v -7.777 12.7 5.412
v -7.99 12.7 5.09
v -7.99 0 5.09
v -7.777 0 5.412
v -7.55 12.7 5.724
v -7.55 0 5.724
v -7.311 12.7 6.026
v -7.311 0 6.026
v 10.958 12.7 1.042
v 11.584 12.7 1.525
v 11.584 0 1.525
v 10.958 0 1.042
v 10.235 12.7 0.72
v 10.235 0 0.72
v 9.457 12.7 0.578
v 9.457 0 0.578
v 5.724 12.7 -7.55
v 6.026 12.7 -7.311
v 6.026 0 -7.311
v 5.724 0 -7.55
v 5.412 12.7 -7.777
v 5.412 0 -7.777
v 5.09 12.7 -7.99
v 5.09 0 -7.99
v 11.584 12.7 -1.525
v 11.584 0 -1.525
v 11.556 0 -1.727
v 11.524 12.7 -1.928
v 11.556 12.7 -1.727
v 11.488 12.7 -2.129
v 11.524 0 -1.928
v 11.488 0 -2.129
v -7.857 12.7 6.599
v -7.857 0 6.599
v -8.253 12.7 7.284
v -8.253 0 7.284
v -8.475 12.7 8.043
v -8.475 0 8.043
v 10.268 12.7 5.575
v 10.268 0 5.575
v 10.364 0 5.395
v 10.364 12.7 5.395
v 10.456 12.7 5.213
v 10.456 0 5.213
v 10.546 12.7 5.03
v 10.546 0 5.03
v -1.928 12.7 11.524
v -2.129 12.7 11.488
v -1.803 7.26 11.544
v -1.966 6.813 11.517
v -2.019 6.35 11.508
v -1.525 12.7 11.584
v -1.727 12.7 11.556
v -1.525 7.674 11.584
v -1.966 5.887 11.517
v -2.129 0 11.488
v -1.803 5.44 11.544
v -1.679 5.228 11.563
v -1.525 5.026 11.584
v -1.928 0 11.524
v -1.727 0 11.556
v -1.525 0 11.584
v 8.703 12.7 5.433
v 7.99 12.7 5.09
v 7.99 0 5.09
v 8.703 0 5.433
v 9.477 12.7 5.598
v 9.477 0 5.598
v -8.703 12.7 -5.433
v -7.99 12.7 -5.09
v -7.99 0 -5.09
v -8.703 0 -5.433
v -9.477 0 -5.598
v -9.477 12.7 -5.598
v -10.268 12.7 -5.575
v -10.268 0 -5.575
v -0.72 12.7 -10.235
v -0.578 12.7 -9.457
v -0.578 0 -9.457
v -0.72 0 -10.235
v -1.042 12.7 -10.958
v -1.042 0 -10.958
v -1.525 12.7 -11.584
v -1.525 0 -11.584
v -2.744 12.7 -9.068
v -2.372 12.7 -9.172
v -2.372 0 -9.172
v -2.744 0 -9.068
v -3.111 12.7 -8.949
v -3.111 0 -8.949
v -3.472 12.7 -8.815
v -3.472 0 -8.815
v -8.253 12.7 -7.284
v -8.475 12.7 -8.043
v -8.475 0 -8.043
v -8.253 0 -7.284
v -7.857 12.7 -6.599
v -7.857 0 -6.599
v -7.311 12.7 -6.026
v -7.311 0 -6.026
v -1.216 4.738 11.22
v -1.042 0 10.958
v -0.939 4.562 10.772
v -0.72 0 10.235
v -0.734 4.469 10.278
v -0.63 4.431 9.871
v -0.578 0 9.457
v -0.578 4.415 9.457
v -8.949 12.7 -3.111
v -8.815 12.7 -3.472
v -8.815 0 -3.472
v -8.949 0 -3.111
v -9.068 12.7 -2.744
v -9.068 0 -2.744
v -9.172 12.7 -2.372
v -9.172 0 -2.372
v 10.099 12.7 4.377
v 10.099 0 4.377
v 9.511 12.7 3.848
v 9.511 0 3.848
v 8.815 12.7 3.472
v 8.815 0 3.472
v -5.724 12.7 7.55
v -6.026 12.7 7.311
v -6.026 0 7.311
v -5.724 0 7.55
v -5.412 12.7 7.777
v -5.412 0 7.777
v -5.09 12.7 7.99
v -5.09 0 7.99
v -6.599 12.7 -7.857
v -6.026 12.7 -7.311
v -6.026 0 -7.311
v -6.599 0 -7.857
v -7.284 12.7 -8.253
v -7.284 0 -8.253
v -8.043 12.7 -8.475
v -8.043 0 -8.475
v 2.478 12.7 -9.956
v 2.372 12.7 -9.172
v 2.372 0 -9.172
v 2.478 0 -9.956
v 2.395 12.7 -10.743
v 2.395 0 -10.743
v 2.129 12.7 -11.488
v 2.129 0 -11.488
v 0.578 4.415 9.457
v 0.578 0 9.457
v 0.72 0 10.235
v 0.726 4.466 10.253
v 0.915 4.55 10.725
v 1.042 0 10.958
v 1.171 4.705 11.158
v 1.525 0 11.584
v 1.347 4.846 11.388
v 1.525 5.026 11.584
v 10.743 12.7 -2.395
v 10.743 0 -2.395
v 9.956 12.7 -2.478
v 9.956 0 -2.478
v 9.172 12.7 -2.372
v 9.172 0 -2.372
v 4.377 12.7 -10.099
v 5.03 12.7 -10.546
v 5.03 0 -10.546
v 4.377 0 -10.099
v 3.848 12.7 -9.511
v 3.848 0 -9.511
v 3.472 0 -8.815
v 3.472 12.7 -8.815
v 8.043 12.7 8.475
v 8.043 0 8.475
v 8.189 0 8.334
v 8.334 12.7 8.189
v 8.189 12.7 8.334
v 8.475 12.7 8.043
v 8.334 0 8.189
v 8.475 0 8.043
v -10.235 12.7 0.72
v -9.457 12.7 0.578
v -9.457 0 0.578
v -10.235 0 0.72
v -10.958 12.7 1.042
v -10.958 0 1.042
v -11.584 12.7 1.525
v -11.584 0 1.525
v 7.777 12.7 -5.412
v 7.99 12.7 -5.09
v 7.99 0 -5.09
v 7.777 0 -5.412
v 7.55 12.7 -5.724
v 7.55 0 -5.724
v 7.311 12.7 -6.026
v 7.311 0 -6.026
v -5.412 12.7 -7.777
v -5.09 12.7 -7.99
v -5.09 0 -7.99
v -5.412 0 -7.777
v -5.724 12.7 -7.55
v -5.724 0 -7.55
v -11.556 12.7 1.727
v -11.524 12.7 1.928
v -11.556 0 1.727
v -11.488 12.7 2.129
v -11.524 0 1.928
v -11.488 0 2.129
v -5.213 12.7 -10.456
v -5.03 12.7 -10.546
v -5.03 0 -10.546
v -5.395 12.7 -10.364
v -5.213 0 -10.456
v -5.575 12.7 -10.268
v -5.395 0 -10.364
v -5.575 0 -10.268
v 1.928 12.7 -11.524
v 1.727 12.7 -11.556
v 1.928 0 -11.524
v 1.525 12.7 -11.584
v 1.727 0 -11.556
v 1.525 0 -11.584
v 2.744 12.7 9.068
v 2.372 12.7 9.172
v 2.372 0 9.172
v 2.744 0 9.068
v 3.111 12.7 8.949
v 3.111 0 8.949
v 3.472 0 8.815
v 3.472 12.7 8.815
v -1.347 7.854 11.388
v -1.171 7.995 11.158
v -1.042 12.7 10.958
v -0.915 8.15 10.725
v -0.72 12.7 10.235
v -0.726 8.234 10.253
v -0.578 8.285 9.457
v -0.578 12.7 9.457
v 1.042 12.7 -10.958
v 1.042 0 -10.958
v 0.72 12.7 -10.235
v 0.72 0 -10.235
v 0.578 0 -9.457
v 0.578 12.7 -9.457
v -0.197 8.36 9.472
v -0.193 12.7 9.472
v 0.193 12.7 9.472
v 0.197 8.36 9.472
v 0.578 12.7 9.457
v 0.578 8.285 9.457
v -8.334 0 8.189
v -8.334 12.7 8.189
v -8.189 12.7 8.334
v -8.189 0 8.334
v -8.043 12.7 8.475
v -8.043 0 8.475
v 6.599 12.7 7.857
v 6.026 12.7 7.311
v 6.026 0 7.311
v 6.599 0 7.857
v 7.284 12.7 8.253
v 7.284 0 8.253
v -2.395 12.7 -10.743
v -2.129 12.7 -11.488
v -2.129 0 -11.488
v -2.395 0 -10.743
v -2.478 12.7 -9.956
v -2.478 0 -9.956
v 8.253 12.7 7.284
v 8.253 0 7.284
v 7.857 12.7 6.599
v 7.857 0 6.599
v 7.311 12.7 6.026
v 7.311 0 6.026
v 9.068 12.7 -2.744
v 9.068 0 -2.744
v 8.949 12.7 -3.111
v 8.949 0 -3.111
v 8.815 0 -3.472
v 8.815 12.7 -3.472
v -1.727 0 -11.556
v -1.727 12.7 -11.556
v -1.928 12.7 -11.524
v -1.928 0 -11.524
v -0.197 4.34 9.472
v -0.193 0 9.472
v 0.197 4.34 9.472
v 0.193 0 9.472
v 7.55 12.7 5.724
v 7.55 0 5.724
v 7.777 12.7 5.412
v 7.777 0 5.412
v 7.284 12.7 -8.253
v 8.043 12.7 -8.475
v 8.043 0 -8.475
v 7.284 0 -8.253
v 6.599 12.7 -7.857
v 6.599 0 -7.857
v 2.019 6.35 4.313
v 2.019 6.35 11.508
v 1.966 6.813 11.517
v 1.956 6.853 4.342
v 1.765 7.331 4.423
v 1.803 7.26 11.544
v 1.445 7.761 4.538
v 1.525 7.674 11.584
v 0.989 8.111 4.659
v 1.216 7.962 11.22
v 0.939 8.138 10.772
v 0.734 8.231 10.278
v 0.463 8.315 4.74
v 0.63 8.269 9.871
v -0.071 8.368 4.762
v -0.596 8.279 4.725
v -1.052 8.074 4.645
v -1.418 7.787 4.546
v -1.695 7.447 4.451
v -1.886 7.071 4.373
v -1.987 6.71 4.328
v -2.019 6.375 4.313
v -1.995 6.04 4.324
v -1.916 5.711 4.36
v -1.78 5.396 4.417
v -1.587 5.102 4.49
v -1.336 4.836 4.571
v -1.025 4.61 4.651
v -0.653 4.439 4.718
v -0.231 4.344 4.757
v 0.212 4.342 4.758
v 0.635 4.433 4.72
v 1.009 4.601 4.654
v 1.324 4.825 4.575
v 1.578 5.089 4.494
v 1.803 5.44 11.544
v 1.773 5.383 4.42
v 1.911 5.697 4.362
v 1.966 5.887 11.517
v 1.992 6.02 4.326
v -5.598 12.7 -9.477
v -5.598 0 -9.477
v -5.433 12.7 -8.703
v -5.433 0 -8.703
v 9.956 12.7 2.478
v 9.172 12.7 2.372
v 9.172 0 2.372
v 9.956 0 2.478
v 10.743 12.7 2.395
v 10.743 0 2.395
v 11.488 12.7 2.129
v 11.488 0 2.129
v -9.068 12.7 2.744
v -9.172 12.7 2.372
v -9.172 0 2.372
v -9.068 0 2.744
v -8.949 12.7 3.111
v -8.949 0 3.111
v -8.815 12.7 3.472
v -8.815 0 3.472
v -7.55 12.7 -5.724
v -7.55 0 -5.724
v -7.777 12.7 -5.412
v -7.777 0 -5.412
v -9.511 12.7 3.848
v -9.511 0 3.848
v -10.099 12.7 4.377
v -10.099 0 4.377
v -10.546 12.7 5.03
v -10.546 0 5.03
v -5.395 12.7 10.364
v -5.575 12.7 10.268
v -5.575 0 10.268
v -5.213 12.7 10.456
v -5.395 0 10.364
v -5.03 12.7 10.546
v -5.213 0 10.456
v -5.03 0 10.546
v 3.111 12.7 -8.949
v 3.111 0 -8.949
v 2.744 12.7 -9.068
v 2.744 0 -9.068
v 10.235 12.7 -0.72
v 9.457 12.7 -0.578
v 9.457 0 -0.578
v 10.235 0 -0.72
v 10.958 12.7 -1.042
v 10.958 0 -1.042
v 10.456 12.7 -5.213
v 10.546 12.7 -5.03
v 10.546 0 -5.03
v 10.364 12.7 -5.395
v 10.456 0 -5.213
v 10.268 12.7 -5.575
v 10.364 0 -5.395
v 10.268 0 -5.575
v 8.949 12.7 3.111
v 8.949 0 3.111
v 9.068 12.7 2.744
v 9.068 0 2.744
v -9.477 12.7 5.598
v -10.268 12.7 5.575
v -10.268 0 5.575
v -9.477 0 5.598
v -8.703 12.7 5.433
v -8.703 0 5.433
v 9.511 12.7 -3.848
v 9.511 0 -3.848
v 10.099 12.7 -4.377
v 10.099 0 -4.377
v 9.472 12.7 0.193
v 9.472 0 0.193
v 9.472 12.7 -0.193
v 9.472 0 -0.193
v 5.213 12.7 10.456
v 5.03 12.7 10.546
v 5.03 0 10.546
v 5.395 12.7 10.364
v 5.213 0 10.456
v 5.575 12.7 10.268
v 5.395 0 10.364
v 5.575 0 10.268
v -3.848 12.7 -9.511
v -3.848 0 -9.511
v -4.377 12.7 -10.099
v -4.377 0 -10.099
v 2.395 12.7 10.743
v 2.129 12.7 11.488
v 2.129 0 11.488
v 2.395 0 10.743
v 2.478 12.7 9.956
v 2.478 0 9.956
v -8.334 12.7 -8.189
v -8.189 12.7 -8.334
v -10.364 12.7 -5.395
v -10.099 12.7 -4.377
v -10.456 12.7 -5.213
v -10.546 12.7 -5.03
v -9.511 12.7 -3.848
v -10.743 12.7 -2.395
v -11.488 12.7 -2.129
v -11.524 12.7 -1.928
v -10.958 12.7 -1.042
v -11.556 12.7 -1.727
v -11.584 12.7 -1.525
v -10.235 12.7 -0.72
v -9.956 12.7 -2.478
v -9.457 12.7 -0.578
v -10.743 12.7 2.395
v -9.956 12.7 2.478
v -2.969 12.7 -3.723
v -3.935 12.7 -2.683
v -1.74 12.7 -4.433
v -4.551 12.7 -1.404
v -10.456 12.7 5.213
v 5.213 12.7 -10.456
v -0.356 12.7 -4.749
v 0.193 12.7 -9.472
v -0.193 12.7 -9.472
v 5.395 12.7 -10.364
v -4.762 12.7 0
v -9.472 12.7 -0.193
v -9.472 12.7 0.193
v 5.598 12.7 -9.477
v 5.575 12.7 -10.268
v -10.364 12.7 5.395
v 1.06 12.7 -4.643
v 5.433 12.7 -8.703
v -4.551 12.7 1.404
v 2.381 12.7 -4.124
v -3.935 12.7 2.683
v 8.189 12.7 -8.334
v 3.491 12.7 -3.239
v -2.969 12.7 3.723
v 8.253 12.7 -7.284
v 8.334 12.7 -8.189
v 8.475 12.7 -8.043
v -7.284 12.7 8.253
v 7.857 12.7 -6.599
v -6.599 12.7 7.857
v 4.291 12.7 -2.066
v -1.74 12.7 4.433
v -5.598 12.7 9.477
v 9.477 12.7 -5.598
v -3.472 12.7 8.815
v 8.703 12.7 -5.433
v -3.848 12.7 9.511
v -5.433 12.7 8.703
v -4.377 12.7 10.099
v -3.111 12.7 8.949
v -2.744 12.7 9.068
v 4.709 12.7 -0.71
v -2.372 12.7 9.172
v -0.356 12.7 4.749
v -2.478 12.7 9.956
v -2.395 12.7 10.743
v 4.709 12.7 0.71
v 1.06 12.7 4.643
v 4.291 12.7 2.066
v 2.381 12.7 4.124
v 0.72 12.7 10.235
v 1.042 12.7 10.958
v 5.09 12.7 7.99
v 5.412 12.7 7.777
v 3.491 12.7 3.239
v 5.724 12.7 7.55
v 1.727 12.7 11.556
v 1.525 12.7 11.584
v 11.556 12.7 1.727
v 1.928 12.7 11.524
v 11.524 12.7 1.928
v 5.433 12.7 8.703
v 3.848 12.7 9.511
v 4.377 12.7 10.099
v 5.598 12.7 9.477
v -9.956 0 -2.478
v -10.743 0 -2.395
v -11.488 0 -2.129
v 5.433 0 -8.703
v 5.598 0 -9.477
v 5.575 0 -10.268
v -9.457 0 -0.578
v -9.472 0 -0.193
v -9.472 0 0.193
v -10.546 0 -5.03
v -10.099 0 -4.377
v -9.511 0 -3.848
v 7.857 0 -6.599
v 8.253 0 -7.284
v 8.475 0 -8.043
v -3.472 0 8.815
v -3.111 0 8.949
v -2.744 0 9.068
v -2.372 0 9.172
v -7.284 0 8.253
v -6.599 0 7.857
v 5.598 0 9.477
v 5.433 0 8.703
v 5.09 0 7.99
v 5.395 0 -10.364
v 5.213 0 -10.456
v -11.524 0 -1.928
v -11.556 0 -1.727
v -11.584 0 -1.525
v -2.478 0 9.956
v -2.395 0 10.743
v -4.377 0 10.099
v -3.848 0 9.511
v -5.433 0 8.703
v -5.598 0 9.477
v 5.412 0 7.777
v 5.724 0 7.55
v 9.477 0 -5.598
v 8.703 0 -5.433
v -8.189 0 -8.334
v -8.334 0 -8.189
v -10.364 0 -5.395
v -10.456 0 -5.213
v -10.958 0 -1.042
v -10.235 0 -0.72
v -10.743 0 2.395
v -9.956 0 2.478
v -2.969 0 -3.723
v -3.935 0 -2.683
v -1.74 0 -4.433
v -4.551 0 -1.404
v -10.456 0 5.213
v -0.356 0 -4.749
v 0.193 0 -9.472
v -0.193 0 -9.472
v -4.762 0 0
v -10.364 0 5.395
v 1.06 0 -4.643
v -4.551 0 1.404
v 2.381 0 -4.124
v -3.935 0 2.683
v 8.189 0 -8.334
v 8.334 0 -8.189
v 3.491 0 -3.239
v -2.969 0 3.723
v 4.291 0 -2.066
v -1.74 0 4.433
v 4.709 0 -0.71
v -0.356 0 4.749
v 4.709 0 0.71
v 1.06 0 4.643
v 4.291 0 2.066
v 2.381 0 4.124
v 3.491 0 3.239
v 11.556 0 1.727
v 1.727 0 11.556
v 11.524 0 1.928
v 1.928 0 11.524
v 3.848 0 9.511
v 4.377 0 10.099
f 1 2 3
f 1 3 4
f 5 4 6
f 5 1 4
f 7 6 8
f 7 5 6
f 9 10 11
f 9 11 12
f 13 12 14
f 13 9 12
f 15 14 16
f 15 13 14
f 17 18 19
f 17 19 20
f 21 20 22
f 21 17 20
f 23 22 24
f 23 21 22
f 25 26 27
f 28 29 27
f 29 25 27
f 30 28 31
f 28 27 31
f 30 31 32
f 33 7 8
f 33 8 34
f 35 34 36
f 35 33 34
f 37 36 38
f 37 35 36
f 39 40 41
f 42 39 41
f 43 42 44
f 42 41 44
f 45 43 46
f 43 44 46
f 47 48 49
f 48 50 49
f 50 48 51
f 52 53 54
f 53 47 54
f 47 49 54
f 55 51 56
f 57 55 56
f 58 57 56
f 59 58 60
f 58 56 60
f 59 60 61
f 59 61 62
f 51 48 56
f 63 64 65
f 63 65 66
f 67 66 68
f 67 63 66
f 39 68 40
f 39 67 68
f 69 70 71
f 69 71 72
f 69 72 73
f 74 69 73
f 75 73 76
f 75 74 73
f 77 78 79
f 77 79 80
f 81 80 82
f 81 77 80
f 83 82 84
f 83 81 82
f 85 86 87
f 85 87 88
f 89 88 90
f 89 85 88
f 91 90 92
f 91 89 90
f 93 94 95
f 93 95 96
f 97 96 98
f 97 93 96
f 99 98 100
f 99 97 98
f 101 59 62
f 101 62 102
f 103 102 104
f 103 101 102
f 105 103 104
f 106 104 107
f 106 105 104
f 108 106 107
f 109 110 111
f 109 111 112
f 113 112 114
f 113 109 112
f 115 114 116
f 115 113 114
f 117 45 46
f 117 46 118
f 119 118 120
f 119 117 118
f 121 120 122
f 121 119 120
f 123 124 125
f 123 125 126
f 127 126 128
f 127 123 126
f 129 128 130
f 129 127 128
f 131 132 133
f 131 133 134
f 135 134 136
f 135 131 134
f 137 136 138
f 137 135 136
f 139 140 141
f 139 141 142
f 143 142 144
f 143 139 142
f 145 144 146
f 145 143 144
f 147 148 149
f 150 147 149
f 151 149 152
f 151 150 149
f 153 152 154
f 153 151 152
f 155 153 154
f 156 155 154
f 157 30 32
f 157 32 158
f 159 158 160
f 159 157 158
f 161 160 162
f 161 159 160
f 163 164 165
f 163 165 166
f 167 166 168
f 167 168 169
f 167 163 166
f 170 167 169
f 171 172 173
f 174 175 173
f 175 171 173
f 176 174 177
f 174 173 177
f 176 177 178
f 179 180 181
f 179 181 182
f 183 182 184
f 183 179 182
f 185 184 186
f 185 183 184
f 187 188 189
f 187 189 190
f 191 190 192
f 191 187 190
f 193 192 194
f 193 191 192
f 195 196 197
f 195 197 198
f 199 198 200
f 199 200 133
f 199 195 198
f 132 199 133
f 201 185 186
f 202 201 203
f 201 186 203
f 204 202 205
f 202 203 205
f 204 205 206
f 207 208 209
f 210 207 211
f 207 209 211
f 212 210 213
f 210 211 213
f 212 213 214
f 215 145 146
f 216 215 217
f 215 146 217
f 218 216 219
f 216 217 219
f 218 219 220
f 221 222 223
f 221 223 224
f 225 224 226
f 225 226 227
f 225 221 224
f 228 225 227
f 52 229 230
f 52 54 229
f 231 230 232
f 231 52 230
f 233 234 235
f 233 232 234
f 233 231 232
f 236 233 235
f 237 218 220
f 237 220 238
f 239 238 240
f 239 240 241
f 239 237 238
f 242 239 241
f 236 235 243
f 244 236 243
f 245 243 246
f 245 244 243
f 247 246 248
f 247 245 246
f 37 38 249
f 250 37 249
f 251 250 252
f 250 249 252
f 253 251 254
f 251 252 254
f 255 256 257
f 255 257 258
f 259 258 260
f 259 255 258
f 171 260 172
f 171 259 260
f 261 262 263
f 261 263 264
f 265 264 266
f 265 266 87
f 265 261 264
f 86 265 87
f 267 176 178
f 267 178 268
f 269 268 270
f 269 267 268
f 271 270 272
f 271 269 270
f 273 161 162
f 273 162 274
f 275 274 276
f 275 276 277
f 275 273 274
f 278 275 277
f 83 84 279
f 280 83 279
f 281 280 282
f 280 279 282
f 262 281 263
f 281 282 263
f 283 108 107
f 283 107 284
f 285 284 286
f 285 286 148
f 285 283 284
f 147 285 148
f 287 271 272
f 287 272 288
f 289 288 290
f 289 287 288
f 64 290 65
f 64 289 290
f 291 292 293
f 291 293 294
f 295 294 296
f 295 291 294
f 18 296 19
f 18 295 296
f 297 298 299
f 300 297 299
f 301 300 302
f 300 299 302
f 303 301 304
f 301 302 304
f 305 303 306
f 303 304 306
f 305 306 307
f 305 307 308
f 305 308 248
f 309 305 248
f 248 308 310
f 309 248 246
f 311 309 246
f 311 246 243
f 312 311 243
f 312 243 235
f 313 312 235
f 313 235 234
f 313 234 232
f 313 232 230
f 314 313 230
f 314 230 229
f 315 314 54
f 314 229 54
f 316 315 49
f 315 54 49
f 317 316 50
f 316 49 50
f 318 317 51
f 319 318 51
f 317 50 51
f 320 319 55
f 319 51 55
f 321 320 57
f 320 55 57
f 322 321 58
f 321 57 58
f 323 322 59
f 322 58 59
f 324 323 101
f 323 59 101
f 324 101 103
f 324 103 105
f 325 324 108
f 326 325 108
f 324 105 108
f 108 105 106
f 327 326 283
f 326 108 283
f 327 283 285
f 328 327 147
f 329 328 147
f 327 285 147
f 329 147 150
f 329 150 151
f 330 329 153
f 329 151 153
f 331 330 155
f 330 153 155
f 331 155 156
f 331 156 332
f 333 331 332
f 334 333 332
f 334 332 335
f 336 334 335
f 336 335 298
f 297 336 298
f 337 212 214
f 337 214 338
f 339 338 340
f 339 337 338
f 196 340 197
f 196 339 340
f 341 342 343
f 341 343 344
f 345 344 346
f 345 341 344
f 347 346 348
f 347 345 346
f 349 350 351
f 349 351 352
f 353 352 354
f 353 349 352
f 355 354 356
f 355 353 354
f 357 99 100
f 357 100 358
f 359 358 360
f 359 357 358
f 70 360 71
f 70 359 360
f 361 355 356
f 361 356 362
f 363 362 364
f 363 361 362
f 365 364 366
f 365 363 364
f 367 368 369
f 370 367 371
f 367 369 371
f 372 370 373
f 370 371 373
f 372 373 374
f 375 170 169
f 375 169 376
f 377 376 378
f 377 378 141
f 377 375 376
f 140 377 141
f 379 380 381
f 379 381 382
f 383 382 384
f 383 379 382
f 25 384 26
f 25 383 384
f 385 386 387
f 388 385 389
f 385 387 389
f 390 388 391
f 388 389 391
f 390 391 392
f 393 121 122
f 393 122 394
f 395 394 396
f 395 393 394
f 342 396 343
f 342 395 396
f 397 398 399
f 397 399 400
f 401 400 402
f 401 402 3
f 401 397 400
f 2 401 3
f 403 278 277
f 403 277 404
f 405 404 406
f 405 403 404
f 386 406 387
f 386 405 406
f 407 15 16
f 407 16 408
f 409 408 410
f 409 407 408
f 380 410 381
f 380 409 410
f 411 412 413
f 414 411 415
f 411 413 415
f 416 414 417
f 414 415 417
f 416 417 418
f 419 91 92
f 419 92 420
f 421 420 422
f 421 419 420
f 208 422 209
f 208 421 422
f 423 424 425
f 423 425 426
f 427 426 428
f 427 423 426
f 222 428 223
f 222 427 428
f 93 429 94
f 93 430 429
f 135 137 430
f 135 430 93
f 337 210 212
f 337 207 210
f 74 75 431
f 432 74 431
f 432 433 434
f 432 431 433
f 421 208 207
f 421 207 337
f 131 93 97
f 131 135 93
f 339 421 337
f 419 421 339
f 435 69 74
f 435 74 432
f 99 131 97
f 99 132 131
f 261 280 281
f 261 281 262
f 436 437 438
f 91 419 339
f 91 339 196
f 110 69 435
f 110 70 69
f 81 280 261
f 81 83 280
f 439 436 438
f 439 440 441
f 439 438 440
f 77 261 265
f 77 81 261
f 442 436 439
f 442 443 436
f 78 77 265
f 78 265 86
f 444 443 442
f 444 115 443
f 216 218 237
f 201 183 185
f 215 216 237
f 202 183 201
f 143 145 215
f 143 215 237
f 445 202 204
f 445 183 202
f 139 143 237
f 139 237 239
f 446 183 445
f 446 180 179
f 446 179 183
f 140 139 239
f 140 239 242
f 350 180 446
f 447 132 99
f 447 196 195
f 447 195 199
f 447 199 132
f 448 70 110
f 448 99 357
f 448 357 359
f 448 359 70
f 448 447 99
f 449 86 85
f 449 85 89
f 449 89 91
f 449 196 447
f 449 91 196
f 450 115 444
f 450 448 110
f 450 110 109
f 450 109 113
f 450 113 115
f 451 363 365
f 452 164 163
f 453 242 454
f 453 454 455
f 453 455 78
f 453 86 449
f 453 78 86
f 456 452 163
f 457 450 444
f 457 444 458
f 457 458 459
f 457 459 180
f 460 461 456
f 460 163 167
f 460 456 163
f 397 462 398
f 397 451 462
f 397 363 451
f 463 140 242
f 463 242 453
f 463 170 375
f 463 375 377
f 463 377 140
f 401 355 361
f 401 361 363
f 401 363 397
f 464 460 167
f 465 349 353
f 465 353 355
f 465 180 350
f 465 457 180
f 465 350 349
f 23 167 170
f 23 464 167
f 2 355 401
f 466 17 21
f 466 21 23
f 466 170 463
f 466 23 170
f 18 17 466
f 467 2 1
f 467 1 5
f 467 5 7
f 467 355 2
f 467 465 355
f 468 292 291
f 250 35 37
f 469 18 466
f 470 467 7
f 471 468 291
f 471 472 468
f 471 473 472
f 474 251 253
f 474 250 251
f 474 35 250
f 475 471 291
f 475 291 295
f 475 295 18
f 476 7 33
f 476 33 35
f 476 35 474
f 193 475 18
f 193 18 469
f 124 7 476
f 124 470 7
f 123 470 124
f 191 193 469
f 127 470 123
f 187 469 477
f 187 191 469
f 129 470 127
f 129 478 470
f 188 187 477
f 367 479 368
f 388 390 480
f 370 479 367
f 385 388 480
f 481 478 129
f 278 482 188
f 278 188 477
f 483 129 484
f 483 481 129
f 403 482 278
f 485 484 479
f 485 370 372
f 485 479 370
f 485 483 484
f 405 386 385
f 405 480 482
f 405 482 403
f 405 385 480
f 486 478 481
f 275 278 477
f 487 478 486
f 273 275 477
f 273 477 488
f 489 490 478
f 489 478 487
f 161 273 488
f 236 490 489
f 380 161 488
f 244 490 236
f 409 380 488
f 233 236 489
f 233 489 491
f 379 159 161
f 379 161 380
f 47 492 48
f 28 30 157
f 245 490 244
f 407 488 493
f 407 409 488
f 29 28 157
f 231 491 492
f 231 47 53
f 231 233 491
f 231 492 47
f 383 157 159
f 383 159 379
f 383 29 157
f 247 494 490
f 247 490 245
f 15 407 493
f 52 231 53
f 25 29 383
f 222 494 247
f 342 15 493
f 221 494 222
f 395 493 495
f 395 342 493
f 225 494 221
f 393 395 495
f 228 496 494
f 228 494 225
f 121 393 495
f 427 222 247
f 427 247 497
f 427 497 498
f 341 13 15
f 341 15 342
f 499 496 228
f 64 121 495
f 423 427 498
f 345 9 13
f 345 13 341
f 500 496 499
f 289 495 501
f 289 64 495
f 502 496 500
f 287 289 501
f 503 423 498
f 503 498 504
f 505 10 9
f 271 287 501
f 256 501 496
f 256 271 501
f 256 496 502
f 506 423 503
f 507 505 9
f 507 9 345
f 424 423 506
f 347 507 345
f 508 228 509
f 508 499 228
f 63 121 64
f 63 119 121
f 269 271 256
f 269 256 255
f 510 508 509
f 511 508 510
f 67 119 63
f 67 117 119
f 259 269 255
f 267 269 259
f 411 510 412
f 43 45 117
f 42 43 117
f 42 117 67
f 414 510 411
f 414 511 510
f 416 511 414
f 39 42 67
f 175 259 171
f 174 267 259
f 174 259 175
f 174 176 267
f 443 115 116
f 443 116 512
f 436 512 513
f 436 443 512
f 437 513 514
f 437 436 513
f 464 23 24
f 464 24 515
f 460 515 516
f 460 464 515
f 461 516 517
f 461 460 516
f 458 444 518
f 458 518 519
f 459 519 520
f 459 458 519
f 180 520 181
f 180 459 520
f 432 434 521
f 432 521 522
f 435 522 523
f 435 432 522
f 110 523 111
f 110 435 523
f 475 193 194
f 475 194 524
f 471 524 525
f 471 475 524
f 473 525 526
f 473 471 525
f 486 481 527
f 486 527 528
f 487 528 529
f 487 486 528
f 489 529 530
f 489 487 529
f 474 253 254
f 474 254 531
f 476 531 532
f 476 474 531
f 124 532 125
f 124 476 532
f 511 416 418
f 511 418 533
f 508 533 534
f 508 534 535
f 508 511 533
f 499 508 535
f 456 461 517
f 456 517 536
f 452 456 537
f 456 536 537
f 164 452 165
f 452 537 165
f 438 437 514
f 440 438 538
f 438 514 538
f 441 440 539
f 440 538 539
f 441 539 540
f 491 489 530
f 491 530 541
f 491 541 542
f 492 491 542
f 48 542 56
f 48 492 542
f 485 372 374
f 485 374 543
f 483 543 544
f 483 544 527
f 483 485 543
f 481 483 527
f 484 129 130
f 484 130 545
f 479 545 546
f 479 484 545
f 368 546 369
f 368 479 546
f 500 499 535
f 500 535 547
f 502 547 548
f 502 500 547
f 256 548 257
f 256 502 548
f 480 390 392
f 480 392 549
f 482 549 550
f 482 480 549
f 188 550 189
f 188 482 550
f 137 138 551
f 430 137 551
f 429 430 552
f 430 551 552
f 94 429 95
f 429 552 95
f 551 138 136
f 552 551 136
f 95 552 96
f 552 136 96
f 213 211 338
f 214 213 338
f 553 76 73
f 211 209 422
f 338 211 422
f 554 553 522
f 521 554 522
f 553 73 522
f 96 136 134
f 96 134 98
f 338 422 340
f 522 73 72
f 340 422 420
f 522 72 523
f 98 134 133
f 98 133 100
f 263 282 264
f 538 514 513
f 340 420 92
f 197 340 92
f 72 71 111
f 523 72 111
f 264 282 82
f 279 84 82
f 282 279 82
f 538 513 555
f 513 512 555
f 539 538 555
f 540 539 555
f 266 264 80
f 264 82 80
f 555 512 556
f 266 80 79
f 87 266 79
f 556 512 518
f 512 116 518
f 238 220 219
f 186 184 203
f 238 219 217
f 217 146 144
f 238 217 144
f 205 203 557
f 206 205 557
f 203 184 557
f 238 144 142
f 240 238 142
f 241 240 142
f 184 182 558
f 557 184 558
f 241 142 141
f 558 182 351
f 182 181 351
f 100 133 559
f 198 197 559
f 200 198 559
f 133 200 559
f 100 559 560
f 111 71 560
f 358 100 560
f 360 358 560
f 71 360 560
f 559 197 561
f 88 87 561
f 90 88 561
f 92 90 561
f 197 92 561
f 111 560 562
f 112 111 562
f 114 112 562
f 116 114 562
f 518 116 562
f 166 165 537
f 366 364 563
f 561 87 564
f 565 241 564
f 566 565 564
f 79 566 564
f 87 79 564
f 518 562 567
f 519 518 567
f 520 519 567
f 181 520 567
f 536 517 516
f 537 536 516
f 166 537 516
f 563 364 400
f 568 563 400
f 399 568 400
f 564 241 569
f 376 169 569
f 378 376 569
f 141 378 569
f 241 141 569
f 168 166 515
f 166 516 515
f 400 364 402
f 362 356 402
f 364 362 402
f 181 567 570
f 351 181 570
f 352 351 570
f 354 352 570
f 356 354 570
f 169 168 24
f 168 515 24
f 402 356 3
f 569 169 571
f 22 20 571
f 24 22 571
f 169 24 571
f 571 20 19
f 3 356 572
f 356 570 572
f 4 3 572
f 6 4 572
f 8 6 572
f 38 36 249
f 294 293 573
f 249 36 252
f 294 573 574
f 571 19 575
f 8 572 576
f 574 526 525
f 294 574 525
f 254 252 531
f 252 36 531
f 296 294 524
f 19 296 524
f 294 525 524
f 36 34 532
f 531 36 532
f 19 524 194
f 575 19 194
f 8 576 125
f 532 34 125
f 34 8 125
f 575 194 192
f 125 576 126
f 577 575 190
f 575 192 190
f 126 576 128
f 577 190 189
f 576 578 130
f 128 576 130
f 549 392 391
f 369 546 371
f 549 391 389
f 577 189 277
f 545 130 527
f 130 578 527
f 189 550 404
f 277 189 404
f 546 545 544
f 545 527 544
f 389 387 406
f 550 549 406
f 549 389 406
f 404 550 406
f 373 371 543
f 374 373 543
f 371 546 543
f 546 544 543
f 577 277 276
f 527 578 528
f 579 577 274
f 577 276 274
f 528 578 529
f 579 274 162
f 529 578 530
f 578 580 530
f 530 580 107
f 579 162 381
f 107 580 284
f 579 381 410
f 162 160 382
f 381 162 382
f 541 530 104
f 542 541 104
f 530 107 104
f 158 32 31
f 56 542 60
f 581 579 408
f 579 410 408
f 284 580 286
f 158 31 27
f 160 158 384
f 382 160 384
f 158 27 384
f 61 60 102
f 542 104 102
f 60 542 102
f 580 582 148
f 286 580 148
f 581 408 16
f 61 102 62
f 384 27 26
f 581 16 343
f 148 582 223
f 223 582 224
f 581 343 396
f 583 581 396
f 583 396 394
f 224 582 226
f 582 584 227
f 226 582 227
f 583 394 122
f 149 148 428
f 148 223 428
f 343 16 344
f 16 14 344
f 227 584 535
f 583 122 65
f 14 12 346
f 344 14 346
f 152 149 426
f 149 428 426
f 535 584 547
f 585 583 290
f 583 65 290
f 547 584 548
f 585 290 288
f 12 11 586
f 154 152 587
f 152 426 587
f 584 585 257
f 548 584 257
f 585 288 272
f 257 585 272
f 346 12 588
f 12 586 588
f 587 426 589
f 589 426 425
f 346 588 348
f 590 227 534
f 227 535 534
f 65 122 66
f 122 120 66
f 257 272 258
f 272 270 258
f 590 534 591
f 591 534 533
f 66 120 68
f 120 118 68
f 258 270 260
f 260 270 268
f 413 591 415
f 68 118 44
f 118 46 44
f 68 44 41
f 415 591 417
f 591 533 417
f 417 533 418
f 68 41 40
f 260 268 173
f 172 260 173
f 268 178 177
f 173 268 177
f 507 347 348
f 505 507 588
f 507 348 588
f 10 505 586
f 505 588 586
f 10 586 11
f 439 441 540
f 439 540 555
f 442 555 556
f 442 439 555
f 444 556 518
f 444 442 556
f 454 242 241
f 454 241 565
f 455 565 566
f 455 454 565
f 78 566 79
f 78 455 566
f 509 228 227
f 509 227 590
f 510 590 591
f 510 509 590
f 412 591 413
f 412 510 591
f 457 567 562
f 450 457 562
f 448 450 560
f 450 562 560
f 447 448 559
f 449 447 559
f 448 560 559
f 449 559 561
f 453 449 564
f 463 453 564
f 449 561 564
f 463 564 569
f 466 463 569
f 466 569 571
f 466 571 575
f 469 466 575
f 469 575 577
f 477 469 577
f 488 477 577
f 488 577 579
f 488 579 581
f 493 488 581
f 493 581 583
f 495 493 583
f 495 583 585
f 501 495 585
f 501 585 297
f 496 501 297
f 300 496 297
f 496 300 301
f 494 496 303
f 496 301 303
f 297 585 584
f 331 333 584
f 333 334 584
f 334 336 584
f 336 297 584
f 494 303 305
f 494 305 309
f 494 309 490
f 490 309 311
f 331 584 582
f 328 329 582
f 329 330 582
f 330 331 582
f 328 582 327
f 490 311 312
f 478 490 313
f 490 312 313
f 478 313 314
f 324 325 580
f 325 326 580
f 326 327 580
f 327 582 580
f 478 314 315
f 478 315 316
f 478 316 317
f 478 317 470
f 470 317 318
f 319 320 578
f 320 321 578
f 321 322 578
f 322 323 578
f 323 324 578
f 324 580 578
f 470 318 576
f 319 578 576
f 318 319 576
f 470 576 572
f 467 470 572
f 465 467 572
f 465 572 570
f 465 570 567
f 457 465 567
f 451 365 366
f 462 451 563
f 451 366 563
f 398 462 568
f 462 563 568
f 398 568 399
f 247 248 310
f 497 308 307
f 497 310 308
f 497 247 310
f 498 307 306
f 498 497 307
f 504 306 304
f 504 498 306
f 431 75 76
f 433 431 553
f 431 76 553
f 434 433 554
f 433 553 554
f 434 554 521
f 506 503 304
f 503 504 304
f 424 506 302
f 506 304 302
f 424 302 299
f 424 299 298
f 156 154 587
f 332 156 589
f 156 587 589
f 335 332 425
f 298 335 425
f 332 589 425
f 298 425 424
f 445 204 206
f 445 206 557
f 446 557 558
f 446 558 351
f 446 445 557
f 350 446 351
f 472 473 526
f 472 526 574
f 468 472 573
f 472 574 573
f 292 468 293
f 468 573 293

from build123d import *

# Parameters (mm, degrees)
SKETCH1_R                    = 11.684
BOSS_EXTRUDE1_DEPTH          = 12.7
F_3_8_0_375_DIAMETER_HOLE1_D = 9.525
CUT_EXTRUDE1_DEPTH           = 21.840386561
CIRPATTERN1_COUNT            = 20
F_10_32_TAPPED_HOLE2_REACH   = 30.849
F_10_32_TAPPED_HOLE2_BORE_R  = 2.0193


with BuildPart() as part:
    # Sketch1 → Boss-Extrude1 (new body)
    with BuildSketch(Plane(origin=(0, 0, 0), x_dir=(1, 0, 0), z_dir=(0, 1, 0))):
        with Locations(Location((0, 0, 0), (0, 0, 270))):
            Circle(SKETCH1_R)
    extrude(amount=BOSS_EXTRUDE1_DEPTH)

    # 3/8 (0.375) Diameter Hole1 (through all)
    with Locations(Plane(origin=(0, 12.7, 0), x_dir=(1, 0, 0), z_dir=(0, 1, 0))):
        with Locations((0, 0)):
            Hole(F_3_8_0_375_DIAMETER_HOLE1_D / 2)

    # Sketch6 → Cut-Extrude1 (cut, through all)
    with BuildSketch(Plane(origin=(0, 12.7, 0), x_dir=(1, 0, 0), z_dir=(0, 1, 0))):
        with BuildLine():
            ThreePointArc((-1.52506803, 11.58404176), (0, 11.684), (1.52506803, 11.58404176))
            ThreePointArc((1.52506803, 11.58404176), (0.859486594, 10.605826694), (0.578386073, 9.456528707))
            ThreePointArc((0.578386073, 9.456528707), (0, 9.4742), (-0.578386073, 9.456528707))
            ThreePointArc((-0.578386073, 9.456528707), (-0.859486594, 10.605826694), (-1.52506803, 11.58404176))
        make_face()
    cut_extrude1 = extrude(amount=-CUT_EXTRUDE1_DEPTH, mode=Mode.SUBTRACT)

    # CirPattern1: Cut-Extrude1 ×20 about axis
    cirpattern1_axis = Axis((0, 0, 0), (0, 1, 0))
    for i in range(1, CIRPATTERN1_COUNT):
        add(cut_extrude1.rotate(cirpattern1_axis, i * 360 / CIRPATTERN1_COUNT), mode=Mode.SUBTRACT)

    # #10-32 Tapped Hole2 bore → #10-32 Tapped Hole2 (cut, up to next)
    with BuildSketch(Plane.XY.offset(11.58404176), mode=Mode.PRIVATE) as f_10_32_tapped_hole2_sk1:
        with Locations((0, 6.35)):
            Circle(F_10_32_TAPPED_HOLE2_BORE_R)
    f_10_32_tapped_hole2_tool1 = extrude(f_10_32_tapped_hole2_sk1.sketch, amount=-F_10_32_TAPPED_HOLE2_REACH, mode=Mode.PRIVATE) & part.part
    add(f_10_32_tapped_hole2_tool1.solids().sort_by_distance((0, 6.35, 11.584042))[0], mode=Mode.SUBTRACT)


solid = part.part
